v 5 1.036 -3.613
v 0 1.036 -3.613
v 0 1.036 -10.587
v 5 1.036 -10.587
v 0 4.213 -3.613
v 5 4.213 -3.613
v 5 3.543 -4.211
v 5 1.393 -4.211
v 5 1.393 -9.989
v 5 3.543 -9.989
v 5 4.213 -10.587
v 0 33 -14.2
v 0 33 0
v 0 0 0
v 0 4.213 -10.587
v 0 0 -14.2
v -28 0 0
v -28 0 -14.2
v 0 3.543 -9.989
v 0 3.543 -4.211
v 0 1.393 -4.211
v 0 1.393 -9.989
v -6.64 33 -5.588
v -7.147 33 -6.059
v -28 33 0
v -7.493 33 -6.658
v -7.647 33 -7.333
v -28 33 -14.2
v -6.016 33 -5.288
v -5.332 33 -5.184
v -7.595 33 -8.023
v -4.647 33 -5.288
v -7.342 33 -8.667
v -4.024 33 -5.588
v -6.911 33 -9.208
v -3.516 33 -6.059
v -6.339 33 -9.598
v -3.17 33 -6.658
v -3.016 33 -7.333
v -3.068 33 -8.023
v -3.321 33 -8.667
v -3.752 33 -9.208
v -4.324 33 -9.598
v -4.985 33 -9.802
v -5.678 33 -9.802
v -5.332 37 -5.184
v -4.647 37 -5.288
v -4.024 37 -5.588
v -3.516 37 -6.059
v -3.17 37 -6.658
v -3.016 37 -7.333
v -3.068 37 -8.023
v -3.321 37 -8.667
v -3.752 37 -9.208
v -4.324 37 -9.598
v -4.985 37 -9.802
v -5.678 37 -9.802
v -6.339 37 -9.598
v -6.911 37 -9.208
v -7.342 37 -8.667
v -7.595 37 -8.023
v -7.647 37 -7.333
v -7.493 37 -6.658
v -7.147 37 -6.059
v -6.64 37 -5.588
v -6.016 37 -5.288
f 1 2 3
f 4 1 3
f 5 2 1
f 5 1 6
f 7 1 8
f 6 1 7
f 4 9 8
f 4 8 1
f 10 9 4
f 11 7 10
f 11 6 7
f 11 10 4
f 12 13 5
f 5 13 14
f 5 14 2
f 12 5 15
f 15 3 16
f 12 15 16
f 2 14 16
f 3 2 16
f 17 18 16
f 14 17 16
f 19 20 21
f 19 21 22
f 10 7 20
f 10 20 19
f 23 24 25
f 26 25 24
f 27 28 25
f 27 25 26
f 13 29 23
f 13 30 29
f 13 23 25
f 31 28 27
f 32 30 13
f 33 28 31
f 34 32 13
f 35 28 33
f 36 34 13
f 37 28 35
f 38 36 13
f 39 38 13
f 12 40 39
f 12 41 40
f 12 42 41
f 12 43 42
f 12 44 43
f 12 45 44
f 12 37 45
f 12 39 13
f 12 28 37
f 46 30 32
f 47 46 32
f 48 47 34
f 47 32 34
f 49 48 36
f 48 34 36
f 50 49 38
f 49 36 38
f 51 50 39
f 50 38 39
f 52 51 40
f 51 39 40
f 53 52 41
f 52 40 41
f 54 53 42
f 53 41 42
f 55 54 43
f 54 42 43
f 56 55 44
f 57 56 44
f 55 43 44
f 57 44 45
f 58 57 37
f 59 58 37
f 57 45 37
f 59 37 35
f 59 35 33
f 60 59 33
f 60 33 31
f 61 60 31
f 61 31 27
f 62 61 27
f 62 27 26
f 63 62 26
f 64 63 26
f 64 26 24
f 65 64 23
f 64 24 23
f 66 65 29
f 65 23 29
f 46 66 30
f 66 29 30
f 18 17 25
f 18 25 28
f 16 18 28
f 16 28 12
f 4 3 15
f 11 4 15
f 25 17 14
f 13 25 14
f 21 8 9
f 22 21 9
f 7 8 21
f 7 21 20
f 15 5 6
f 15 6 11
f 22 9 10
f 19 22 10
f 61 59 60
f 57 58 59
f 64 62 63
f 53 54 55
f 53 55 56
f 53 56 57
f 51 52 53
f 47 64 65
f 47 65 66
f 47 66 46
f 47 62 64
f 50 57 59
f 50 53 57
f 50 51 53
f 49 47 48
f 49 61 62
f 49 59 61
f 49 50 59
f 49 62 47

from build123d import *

# Parameters (mm, degrees)
SKETCH1_W           = 28
SKETCH1_H           = 14.2
BOSS_EXTRUDE1_DEPTH = 33
SKETCH2_R           = 2.321908149
BOSS_EXTRUDE3_DEPTH = 4
SKETCH3_W           = 6.974752534
SKETCH3_H           = 3.176308394
BOSS_EXTRUDE4_DEPTH = 5
SKETCH4_W           = 5.77752576
SKETCH4_H           = 2.149777027
CUT_EXTRUDE1_DEPTH  = 5


with BuildPart() as part:
    # Sketch1 → Boss-Extrude1 (new body)
    with BuildSketch(Plane(origin=(0, 0, 0), x_dir=(1, 0, 0), z_dir=(0, 1, 0))):
        with Locations((-14, 7.1)):
            Rectangle(SKETCH1_W, SKETCH1_H)
    extrude(amount=BOSS_EXTRUDE1_DEPTH)

    # Sketch2 → Boss-Extrude3 (add)
    with BuildSketch(Plane(origin=(0, 33, 0), x_dir=(1, 0, 0), z_dir=(0, 1, 0))):
        with Locations(Location((-5.331542912, 7.506333926, 0), (0, 0, 270))):
            Circle(SKETCH2_R)
    extrude(amount=BOSS_EXTRUDE3_DEPTH)

    # Sketch3 → Boss-Extrude4 (add)
    with BuildSketch(Plane(origin=(0, 0, 0), x_dir=(0, 0, -1), z_dir=(1, 0, 0))):
        with Locations((7.1, 2.624490745)):
            Rectangle(SKETCH3_W, SKETCH3_H)
    extrude(amount=BOSS_EXTRUDE4_DEPTH)

    # Sketch4 → Cut-Extrude1 (cut)
    with BuildSketch(Plane(origin=(5, 0, 0), x_dir=(0, 0, -1), z_dir=(1, 0, 0))):
        with Locations((7.1, 2.467865933)):
            Rectangle(SKETCH4_W, SKETCH4_H)
    extrude(amount=-CUT_EXTRUDE1_DEPTH, mode=Mode.SUBTRACT)


solid = part.part
